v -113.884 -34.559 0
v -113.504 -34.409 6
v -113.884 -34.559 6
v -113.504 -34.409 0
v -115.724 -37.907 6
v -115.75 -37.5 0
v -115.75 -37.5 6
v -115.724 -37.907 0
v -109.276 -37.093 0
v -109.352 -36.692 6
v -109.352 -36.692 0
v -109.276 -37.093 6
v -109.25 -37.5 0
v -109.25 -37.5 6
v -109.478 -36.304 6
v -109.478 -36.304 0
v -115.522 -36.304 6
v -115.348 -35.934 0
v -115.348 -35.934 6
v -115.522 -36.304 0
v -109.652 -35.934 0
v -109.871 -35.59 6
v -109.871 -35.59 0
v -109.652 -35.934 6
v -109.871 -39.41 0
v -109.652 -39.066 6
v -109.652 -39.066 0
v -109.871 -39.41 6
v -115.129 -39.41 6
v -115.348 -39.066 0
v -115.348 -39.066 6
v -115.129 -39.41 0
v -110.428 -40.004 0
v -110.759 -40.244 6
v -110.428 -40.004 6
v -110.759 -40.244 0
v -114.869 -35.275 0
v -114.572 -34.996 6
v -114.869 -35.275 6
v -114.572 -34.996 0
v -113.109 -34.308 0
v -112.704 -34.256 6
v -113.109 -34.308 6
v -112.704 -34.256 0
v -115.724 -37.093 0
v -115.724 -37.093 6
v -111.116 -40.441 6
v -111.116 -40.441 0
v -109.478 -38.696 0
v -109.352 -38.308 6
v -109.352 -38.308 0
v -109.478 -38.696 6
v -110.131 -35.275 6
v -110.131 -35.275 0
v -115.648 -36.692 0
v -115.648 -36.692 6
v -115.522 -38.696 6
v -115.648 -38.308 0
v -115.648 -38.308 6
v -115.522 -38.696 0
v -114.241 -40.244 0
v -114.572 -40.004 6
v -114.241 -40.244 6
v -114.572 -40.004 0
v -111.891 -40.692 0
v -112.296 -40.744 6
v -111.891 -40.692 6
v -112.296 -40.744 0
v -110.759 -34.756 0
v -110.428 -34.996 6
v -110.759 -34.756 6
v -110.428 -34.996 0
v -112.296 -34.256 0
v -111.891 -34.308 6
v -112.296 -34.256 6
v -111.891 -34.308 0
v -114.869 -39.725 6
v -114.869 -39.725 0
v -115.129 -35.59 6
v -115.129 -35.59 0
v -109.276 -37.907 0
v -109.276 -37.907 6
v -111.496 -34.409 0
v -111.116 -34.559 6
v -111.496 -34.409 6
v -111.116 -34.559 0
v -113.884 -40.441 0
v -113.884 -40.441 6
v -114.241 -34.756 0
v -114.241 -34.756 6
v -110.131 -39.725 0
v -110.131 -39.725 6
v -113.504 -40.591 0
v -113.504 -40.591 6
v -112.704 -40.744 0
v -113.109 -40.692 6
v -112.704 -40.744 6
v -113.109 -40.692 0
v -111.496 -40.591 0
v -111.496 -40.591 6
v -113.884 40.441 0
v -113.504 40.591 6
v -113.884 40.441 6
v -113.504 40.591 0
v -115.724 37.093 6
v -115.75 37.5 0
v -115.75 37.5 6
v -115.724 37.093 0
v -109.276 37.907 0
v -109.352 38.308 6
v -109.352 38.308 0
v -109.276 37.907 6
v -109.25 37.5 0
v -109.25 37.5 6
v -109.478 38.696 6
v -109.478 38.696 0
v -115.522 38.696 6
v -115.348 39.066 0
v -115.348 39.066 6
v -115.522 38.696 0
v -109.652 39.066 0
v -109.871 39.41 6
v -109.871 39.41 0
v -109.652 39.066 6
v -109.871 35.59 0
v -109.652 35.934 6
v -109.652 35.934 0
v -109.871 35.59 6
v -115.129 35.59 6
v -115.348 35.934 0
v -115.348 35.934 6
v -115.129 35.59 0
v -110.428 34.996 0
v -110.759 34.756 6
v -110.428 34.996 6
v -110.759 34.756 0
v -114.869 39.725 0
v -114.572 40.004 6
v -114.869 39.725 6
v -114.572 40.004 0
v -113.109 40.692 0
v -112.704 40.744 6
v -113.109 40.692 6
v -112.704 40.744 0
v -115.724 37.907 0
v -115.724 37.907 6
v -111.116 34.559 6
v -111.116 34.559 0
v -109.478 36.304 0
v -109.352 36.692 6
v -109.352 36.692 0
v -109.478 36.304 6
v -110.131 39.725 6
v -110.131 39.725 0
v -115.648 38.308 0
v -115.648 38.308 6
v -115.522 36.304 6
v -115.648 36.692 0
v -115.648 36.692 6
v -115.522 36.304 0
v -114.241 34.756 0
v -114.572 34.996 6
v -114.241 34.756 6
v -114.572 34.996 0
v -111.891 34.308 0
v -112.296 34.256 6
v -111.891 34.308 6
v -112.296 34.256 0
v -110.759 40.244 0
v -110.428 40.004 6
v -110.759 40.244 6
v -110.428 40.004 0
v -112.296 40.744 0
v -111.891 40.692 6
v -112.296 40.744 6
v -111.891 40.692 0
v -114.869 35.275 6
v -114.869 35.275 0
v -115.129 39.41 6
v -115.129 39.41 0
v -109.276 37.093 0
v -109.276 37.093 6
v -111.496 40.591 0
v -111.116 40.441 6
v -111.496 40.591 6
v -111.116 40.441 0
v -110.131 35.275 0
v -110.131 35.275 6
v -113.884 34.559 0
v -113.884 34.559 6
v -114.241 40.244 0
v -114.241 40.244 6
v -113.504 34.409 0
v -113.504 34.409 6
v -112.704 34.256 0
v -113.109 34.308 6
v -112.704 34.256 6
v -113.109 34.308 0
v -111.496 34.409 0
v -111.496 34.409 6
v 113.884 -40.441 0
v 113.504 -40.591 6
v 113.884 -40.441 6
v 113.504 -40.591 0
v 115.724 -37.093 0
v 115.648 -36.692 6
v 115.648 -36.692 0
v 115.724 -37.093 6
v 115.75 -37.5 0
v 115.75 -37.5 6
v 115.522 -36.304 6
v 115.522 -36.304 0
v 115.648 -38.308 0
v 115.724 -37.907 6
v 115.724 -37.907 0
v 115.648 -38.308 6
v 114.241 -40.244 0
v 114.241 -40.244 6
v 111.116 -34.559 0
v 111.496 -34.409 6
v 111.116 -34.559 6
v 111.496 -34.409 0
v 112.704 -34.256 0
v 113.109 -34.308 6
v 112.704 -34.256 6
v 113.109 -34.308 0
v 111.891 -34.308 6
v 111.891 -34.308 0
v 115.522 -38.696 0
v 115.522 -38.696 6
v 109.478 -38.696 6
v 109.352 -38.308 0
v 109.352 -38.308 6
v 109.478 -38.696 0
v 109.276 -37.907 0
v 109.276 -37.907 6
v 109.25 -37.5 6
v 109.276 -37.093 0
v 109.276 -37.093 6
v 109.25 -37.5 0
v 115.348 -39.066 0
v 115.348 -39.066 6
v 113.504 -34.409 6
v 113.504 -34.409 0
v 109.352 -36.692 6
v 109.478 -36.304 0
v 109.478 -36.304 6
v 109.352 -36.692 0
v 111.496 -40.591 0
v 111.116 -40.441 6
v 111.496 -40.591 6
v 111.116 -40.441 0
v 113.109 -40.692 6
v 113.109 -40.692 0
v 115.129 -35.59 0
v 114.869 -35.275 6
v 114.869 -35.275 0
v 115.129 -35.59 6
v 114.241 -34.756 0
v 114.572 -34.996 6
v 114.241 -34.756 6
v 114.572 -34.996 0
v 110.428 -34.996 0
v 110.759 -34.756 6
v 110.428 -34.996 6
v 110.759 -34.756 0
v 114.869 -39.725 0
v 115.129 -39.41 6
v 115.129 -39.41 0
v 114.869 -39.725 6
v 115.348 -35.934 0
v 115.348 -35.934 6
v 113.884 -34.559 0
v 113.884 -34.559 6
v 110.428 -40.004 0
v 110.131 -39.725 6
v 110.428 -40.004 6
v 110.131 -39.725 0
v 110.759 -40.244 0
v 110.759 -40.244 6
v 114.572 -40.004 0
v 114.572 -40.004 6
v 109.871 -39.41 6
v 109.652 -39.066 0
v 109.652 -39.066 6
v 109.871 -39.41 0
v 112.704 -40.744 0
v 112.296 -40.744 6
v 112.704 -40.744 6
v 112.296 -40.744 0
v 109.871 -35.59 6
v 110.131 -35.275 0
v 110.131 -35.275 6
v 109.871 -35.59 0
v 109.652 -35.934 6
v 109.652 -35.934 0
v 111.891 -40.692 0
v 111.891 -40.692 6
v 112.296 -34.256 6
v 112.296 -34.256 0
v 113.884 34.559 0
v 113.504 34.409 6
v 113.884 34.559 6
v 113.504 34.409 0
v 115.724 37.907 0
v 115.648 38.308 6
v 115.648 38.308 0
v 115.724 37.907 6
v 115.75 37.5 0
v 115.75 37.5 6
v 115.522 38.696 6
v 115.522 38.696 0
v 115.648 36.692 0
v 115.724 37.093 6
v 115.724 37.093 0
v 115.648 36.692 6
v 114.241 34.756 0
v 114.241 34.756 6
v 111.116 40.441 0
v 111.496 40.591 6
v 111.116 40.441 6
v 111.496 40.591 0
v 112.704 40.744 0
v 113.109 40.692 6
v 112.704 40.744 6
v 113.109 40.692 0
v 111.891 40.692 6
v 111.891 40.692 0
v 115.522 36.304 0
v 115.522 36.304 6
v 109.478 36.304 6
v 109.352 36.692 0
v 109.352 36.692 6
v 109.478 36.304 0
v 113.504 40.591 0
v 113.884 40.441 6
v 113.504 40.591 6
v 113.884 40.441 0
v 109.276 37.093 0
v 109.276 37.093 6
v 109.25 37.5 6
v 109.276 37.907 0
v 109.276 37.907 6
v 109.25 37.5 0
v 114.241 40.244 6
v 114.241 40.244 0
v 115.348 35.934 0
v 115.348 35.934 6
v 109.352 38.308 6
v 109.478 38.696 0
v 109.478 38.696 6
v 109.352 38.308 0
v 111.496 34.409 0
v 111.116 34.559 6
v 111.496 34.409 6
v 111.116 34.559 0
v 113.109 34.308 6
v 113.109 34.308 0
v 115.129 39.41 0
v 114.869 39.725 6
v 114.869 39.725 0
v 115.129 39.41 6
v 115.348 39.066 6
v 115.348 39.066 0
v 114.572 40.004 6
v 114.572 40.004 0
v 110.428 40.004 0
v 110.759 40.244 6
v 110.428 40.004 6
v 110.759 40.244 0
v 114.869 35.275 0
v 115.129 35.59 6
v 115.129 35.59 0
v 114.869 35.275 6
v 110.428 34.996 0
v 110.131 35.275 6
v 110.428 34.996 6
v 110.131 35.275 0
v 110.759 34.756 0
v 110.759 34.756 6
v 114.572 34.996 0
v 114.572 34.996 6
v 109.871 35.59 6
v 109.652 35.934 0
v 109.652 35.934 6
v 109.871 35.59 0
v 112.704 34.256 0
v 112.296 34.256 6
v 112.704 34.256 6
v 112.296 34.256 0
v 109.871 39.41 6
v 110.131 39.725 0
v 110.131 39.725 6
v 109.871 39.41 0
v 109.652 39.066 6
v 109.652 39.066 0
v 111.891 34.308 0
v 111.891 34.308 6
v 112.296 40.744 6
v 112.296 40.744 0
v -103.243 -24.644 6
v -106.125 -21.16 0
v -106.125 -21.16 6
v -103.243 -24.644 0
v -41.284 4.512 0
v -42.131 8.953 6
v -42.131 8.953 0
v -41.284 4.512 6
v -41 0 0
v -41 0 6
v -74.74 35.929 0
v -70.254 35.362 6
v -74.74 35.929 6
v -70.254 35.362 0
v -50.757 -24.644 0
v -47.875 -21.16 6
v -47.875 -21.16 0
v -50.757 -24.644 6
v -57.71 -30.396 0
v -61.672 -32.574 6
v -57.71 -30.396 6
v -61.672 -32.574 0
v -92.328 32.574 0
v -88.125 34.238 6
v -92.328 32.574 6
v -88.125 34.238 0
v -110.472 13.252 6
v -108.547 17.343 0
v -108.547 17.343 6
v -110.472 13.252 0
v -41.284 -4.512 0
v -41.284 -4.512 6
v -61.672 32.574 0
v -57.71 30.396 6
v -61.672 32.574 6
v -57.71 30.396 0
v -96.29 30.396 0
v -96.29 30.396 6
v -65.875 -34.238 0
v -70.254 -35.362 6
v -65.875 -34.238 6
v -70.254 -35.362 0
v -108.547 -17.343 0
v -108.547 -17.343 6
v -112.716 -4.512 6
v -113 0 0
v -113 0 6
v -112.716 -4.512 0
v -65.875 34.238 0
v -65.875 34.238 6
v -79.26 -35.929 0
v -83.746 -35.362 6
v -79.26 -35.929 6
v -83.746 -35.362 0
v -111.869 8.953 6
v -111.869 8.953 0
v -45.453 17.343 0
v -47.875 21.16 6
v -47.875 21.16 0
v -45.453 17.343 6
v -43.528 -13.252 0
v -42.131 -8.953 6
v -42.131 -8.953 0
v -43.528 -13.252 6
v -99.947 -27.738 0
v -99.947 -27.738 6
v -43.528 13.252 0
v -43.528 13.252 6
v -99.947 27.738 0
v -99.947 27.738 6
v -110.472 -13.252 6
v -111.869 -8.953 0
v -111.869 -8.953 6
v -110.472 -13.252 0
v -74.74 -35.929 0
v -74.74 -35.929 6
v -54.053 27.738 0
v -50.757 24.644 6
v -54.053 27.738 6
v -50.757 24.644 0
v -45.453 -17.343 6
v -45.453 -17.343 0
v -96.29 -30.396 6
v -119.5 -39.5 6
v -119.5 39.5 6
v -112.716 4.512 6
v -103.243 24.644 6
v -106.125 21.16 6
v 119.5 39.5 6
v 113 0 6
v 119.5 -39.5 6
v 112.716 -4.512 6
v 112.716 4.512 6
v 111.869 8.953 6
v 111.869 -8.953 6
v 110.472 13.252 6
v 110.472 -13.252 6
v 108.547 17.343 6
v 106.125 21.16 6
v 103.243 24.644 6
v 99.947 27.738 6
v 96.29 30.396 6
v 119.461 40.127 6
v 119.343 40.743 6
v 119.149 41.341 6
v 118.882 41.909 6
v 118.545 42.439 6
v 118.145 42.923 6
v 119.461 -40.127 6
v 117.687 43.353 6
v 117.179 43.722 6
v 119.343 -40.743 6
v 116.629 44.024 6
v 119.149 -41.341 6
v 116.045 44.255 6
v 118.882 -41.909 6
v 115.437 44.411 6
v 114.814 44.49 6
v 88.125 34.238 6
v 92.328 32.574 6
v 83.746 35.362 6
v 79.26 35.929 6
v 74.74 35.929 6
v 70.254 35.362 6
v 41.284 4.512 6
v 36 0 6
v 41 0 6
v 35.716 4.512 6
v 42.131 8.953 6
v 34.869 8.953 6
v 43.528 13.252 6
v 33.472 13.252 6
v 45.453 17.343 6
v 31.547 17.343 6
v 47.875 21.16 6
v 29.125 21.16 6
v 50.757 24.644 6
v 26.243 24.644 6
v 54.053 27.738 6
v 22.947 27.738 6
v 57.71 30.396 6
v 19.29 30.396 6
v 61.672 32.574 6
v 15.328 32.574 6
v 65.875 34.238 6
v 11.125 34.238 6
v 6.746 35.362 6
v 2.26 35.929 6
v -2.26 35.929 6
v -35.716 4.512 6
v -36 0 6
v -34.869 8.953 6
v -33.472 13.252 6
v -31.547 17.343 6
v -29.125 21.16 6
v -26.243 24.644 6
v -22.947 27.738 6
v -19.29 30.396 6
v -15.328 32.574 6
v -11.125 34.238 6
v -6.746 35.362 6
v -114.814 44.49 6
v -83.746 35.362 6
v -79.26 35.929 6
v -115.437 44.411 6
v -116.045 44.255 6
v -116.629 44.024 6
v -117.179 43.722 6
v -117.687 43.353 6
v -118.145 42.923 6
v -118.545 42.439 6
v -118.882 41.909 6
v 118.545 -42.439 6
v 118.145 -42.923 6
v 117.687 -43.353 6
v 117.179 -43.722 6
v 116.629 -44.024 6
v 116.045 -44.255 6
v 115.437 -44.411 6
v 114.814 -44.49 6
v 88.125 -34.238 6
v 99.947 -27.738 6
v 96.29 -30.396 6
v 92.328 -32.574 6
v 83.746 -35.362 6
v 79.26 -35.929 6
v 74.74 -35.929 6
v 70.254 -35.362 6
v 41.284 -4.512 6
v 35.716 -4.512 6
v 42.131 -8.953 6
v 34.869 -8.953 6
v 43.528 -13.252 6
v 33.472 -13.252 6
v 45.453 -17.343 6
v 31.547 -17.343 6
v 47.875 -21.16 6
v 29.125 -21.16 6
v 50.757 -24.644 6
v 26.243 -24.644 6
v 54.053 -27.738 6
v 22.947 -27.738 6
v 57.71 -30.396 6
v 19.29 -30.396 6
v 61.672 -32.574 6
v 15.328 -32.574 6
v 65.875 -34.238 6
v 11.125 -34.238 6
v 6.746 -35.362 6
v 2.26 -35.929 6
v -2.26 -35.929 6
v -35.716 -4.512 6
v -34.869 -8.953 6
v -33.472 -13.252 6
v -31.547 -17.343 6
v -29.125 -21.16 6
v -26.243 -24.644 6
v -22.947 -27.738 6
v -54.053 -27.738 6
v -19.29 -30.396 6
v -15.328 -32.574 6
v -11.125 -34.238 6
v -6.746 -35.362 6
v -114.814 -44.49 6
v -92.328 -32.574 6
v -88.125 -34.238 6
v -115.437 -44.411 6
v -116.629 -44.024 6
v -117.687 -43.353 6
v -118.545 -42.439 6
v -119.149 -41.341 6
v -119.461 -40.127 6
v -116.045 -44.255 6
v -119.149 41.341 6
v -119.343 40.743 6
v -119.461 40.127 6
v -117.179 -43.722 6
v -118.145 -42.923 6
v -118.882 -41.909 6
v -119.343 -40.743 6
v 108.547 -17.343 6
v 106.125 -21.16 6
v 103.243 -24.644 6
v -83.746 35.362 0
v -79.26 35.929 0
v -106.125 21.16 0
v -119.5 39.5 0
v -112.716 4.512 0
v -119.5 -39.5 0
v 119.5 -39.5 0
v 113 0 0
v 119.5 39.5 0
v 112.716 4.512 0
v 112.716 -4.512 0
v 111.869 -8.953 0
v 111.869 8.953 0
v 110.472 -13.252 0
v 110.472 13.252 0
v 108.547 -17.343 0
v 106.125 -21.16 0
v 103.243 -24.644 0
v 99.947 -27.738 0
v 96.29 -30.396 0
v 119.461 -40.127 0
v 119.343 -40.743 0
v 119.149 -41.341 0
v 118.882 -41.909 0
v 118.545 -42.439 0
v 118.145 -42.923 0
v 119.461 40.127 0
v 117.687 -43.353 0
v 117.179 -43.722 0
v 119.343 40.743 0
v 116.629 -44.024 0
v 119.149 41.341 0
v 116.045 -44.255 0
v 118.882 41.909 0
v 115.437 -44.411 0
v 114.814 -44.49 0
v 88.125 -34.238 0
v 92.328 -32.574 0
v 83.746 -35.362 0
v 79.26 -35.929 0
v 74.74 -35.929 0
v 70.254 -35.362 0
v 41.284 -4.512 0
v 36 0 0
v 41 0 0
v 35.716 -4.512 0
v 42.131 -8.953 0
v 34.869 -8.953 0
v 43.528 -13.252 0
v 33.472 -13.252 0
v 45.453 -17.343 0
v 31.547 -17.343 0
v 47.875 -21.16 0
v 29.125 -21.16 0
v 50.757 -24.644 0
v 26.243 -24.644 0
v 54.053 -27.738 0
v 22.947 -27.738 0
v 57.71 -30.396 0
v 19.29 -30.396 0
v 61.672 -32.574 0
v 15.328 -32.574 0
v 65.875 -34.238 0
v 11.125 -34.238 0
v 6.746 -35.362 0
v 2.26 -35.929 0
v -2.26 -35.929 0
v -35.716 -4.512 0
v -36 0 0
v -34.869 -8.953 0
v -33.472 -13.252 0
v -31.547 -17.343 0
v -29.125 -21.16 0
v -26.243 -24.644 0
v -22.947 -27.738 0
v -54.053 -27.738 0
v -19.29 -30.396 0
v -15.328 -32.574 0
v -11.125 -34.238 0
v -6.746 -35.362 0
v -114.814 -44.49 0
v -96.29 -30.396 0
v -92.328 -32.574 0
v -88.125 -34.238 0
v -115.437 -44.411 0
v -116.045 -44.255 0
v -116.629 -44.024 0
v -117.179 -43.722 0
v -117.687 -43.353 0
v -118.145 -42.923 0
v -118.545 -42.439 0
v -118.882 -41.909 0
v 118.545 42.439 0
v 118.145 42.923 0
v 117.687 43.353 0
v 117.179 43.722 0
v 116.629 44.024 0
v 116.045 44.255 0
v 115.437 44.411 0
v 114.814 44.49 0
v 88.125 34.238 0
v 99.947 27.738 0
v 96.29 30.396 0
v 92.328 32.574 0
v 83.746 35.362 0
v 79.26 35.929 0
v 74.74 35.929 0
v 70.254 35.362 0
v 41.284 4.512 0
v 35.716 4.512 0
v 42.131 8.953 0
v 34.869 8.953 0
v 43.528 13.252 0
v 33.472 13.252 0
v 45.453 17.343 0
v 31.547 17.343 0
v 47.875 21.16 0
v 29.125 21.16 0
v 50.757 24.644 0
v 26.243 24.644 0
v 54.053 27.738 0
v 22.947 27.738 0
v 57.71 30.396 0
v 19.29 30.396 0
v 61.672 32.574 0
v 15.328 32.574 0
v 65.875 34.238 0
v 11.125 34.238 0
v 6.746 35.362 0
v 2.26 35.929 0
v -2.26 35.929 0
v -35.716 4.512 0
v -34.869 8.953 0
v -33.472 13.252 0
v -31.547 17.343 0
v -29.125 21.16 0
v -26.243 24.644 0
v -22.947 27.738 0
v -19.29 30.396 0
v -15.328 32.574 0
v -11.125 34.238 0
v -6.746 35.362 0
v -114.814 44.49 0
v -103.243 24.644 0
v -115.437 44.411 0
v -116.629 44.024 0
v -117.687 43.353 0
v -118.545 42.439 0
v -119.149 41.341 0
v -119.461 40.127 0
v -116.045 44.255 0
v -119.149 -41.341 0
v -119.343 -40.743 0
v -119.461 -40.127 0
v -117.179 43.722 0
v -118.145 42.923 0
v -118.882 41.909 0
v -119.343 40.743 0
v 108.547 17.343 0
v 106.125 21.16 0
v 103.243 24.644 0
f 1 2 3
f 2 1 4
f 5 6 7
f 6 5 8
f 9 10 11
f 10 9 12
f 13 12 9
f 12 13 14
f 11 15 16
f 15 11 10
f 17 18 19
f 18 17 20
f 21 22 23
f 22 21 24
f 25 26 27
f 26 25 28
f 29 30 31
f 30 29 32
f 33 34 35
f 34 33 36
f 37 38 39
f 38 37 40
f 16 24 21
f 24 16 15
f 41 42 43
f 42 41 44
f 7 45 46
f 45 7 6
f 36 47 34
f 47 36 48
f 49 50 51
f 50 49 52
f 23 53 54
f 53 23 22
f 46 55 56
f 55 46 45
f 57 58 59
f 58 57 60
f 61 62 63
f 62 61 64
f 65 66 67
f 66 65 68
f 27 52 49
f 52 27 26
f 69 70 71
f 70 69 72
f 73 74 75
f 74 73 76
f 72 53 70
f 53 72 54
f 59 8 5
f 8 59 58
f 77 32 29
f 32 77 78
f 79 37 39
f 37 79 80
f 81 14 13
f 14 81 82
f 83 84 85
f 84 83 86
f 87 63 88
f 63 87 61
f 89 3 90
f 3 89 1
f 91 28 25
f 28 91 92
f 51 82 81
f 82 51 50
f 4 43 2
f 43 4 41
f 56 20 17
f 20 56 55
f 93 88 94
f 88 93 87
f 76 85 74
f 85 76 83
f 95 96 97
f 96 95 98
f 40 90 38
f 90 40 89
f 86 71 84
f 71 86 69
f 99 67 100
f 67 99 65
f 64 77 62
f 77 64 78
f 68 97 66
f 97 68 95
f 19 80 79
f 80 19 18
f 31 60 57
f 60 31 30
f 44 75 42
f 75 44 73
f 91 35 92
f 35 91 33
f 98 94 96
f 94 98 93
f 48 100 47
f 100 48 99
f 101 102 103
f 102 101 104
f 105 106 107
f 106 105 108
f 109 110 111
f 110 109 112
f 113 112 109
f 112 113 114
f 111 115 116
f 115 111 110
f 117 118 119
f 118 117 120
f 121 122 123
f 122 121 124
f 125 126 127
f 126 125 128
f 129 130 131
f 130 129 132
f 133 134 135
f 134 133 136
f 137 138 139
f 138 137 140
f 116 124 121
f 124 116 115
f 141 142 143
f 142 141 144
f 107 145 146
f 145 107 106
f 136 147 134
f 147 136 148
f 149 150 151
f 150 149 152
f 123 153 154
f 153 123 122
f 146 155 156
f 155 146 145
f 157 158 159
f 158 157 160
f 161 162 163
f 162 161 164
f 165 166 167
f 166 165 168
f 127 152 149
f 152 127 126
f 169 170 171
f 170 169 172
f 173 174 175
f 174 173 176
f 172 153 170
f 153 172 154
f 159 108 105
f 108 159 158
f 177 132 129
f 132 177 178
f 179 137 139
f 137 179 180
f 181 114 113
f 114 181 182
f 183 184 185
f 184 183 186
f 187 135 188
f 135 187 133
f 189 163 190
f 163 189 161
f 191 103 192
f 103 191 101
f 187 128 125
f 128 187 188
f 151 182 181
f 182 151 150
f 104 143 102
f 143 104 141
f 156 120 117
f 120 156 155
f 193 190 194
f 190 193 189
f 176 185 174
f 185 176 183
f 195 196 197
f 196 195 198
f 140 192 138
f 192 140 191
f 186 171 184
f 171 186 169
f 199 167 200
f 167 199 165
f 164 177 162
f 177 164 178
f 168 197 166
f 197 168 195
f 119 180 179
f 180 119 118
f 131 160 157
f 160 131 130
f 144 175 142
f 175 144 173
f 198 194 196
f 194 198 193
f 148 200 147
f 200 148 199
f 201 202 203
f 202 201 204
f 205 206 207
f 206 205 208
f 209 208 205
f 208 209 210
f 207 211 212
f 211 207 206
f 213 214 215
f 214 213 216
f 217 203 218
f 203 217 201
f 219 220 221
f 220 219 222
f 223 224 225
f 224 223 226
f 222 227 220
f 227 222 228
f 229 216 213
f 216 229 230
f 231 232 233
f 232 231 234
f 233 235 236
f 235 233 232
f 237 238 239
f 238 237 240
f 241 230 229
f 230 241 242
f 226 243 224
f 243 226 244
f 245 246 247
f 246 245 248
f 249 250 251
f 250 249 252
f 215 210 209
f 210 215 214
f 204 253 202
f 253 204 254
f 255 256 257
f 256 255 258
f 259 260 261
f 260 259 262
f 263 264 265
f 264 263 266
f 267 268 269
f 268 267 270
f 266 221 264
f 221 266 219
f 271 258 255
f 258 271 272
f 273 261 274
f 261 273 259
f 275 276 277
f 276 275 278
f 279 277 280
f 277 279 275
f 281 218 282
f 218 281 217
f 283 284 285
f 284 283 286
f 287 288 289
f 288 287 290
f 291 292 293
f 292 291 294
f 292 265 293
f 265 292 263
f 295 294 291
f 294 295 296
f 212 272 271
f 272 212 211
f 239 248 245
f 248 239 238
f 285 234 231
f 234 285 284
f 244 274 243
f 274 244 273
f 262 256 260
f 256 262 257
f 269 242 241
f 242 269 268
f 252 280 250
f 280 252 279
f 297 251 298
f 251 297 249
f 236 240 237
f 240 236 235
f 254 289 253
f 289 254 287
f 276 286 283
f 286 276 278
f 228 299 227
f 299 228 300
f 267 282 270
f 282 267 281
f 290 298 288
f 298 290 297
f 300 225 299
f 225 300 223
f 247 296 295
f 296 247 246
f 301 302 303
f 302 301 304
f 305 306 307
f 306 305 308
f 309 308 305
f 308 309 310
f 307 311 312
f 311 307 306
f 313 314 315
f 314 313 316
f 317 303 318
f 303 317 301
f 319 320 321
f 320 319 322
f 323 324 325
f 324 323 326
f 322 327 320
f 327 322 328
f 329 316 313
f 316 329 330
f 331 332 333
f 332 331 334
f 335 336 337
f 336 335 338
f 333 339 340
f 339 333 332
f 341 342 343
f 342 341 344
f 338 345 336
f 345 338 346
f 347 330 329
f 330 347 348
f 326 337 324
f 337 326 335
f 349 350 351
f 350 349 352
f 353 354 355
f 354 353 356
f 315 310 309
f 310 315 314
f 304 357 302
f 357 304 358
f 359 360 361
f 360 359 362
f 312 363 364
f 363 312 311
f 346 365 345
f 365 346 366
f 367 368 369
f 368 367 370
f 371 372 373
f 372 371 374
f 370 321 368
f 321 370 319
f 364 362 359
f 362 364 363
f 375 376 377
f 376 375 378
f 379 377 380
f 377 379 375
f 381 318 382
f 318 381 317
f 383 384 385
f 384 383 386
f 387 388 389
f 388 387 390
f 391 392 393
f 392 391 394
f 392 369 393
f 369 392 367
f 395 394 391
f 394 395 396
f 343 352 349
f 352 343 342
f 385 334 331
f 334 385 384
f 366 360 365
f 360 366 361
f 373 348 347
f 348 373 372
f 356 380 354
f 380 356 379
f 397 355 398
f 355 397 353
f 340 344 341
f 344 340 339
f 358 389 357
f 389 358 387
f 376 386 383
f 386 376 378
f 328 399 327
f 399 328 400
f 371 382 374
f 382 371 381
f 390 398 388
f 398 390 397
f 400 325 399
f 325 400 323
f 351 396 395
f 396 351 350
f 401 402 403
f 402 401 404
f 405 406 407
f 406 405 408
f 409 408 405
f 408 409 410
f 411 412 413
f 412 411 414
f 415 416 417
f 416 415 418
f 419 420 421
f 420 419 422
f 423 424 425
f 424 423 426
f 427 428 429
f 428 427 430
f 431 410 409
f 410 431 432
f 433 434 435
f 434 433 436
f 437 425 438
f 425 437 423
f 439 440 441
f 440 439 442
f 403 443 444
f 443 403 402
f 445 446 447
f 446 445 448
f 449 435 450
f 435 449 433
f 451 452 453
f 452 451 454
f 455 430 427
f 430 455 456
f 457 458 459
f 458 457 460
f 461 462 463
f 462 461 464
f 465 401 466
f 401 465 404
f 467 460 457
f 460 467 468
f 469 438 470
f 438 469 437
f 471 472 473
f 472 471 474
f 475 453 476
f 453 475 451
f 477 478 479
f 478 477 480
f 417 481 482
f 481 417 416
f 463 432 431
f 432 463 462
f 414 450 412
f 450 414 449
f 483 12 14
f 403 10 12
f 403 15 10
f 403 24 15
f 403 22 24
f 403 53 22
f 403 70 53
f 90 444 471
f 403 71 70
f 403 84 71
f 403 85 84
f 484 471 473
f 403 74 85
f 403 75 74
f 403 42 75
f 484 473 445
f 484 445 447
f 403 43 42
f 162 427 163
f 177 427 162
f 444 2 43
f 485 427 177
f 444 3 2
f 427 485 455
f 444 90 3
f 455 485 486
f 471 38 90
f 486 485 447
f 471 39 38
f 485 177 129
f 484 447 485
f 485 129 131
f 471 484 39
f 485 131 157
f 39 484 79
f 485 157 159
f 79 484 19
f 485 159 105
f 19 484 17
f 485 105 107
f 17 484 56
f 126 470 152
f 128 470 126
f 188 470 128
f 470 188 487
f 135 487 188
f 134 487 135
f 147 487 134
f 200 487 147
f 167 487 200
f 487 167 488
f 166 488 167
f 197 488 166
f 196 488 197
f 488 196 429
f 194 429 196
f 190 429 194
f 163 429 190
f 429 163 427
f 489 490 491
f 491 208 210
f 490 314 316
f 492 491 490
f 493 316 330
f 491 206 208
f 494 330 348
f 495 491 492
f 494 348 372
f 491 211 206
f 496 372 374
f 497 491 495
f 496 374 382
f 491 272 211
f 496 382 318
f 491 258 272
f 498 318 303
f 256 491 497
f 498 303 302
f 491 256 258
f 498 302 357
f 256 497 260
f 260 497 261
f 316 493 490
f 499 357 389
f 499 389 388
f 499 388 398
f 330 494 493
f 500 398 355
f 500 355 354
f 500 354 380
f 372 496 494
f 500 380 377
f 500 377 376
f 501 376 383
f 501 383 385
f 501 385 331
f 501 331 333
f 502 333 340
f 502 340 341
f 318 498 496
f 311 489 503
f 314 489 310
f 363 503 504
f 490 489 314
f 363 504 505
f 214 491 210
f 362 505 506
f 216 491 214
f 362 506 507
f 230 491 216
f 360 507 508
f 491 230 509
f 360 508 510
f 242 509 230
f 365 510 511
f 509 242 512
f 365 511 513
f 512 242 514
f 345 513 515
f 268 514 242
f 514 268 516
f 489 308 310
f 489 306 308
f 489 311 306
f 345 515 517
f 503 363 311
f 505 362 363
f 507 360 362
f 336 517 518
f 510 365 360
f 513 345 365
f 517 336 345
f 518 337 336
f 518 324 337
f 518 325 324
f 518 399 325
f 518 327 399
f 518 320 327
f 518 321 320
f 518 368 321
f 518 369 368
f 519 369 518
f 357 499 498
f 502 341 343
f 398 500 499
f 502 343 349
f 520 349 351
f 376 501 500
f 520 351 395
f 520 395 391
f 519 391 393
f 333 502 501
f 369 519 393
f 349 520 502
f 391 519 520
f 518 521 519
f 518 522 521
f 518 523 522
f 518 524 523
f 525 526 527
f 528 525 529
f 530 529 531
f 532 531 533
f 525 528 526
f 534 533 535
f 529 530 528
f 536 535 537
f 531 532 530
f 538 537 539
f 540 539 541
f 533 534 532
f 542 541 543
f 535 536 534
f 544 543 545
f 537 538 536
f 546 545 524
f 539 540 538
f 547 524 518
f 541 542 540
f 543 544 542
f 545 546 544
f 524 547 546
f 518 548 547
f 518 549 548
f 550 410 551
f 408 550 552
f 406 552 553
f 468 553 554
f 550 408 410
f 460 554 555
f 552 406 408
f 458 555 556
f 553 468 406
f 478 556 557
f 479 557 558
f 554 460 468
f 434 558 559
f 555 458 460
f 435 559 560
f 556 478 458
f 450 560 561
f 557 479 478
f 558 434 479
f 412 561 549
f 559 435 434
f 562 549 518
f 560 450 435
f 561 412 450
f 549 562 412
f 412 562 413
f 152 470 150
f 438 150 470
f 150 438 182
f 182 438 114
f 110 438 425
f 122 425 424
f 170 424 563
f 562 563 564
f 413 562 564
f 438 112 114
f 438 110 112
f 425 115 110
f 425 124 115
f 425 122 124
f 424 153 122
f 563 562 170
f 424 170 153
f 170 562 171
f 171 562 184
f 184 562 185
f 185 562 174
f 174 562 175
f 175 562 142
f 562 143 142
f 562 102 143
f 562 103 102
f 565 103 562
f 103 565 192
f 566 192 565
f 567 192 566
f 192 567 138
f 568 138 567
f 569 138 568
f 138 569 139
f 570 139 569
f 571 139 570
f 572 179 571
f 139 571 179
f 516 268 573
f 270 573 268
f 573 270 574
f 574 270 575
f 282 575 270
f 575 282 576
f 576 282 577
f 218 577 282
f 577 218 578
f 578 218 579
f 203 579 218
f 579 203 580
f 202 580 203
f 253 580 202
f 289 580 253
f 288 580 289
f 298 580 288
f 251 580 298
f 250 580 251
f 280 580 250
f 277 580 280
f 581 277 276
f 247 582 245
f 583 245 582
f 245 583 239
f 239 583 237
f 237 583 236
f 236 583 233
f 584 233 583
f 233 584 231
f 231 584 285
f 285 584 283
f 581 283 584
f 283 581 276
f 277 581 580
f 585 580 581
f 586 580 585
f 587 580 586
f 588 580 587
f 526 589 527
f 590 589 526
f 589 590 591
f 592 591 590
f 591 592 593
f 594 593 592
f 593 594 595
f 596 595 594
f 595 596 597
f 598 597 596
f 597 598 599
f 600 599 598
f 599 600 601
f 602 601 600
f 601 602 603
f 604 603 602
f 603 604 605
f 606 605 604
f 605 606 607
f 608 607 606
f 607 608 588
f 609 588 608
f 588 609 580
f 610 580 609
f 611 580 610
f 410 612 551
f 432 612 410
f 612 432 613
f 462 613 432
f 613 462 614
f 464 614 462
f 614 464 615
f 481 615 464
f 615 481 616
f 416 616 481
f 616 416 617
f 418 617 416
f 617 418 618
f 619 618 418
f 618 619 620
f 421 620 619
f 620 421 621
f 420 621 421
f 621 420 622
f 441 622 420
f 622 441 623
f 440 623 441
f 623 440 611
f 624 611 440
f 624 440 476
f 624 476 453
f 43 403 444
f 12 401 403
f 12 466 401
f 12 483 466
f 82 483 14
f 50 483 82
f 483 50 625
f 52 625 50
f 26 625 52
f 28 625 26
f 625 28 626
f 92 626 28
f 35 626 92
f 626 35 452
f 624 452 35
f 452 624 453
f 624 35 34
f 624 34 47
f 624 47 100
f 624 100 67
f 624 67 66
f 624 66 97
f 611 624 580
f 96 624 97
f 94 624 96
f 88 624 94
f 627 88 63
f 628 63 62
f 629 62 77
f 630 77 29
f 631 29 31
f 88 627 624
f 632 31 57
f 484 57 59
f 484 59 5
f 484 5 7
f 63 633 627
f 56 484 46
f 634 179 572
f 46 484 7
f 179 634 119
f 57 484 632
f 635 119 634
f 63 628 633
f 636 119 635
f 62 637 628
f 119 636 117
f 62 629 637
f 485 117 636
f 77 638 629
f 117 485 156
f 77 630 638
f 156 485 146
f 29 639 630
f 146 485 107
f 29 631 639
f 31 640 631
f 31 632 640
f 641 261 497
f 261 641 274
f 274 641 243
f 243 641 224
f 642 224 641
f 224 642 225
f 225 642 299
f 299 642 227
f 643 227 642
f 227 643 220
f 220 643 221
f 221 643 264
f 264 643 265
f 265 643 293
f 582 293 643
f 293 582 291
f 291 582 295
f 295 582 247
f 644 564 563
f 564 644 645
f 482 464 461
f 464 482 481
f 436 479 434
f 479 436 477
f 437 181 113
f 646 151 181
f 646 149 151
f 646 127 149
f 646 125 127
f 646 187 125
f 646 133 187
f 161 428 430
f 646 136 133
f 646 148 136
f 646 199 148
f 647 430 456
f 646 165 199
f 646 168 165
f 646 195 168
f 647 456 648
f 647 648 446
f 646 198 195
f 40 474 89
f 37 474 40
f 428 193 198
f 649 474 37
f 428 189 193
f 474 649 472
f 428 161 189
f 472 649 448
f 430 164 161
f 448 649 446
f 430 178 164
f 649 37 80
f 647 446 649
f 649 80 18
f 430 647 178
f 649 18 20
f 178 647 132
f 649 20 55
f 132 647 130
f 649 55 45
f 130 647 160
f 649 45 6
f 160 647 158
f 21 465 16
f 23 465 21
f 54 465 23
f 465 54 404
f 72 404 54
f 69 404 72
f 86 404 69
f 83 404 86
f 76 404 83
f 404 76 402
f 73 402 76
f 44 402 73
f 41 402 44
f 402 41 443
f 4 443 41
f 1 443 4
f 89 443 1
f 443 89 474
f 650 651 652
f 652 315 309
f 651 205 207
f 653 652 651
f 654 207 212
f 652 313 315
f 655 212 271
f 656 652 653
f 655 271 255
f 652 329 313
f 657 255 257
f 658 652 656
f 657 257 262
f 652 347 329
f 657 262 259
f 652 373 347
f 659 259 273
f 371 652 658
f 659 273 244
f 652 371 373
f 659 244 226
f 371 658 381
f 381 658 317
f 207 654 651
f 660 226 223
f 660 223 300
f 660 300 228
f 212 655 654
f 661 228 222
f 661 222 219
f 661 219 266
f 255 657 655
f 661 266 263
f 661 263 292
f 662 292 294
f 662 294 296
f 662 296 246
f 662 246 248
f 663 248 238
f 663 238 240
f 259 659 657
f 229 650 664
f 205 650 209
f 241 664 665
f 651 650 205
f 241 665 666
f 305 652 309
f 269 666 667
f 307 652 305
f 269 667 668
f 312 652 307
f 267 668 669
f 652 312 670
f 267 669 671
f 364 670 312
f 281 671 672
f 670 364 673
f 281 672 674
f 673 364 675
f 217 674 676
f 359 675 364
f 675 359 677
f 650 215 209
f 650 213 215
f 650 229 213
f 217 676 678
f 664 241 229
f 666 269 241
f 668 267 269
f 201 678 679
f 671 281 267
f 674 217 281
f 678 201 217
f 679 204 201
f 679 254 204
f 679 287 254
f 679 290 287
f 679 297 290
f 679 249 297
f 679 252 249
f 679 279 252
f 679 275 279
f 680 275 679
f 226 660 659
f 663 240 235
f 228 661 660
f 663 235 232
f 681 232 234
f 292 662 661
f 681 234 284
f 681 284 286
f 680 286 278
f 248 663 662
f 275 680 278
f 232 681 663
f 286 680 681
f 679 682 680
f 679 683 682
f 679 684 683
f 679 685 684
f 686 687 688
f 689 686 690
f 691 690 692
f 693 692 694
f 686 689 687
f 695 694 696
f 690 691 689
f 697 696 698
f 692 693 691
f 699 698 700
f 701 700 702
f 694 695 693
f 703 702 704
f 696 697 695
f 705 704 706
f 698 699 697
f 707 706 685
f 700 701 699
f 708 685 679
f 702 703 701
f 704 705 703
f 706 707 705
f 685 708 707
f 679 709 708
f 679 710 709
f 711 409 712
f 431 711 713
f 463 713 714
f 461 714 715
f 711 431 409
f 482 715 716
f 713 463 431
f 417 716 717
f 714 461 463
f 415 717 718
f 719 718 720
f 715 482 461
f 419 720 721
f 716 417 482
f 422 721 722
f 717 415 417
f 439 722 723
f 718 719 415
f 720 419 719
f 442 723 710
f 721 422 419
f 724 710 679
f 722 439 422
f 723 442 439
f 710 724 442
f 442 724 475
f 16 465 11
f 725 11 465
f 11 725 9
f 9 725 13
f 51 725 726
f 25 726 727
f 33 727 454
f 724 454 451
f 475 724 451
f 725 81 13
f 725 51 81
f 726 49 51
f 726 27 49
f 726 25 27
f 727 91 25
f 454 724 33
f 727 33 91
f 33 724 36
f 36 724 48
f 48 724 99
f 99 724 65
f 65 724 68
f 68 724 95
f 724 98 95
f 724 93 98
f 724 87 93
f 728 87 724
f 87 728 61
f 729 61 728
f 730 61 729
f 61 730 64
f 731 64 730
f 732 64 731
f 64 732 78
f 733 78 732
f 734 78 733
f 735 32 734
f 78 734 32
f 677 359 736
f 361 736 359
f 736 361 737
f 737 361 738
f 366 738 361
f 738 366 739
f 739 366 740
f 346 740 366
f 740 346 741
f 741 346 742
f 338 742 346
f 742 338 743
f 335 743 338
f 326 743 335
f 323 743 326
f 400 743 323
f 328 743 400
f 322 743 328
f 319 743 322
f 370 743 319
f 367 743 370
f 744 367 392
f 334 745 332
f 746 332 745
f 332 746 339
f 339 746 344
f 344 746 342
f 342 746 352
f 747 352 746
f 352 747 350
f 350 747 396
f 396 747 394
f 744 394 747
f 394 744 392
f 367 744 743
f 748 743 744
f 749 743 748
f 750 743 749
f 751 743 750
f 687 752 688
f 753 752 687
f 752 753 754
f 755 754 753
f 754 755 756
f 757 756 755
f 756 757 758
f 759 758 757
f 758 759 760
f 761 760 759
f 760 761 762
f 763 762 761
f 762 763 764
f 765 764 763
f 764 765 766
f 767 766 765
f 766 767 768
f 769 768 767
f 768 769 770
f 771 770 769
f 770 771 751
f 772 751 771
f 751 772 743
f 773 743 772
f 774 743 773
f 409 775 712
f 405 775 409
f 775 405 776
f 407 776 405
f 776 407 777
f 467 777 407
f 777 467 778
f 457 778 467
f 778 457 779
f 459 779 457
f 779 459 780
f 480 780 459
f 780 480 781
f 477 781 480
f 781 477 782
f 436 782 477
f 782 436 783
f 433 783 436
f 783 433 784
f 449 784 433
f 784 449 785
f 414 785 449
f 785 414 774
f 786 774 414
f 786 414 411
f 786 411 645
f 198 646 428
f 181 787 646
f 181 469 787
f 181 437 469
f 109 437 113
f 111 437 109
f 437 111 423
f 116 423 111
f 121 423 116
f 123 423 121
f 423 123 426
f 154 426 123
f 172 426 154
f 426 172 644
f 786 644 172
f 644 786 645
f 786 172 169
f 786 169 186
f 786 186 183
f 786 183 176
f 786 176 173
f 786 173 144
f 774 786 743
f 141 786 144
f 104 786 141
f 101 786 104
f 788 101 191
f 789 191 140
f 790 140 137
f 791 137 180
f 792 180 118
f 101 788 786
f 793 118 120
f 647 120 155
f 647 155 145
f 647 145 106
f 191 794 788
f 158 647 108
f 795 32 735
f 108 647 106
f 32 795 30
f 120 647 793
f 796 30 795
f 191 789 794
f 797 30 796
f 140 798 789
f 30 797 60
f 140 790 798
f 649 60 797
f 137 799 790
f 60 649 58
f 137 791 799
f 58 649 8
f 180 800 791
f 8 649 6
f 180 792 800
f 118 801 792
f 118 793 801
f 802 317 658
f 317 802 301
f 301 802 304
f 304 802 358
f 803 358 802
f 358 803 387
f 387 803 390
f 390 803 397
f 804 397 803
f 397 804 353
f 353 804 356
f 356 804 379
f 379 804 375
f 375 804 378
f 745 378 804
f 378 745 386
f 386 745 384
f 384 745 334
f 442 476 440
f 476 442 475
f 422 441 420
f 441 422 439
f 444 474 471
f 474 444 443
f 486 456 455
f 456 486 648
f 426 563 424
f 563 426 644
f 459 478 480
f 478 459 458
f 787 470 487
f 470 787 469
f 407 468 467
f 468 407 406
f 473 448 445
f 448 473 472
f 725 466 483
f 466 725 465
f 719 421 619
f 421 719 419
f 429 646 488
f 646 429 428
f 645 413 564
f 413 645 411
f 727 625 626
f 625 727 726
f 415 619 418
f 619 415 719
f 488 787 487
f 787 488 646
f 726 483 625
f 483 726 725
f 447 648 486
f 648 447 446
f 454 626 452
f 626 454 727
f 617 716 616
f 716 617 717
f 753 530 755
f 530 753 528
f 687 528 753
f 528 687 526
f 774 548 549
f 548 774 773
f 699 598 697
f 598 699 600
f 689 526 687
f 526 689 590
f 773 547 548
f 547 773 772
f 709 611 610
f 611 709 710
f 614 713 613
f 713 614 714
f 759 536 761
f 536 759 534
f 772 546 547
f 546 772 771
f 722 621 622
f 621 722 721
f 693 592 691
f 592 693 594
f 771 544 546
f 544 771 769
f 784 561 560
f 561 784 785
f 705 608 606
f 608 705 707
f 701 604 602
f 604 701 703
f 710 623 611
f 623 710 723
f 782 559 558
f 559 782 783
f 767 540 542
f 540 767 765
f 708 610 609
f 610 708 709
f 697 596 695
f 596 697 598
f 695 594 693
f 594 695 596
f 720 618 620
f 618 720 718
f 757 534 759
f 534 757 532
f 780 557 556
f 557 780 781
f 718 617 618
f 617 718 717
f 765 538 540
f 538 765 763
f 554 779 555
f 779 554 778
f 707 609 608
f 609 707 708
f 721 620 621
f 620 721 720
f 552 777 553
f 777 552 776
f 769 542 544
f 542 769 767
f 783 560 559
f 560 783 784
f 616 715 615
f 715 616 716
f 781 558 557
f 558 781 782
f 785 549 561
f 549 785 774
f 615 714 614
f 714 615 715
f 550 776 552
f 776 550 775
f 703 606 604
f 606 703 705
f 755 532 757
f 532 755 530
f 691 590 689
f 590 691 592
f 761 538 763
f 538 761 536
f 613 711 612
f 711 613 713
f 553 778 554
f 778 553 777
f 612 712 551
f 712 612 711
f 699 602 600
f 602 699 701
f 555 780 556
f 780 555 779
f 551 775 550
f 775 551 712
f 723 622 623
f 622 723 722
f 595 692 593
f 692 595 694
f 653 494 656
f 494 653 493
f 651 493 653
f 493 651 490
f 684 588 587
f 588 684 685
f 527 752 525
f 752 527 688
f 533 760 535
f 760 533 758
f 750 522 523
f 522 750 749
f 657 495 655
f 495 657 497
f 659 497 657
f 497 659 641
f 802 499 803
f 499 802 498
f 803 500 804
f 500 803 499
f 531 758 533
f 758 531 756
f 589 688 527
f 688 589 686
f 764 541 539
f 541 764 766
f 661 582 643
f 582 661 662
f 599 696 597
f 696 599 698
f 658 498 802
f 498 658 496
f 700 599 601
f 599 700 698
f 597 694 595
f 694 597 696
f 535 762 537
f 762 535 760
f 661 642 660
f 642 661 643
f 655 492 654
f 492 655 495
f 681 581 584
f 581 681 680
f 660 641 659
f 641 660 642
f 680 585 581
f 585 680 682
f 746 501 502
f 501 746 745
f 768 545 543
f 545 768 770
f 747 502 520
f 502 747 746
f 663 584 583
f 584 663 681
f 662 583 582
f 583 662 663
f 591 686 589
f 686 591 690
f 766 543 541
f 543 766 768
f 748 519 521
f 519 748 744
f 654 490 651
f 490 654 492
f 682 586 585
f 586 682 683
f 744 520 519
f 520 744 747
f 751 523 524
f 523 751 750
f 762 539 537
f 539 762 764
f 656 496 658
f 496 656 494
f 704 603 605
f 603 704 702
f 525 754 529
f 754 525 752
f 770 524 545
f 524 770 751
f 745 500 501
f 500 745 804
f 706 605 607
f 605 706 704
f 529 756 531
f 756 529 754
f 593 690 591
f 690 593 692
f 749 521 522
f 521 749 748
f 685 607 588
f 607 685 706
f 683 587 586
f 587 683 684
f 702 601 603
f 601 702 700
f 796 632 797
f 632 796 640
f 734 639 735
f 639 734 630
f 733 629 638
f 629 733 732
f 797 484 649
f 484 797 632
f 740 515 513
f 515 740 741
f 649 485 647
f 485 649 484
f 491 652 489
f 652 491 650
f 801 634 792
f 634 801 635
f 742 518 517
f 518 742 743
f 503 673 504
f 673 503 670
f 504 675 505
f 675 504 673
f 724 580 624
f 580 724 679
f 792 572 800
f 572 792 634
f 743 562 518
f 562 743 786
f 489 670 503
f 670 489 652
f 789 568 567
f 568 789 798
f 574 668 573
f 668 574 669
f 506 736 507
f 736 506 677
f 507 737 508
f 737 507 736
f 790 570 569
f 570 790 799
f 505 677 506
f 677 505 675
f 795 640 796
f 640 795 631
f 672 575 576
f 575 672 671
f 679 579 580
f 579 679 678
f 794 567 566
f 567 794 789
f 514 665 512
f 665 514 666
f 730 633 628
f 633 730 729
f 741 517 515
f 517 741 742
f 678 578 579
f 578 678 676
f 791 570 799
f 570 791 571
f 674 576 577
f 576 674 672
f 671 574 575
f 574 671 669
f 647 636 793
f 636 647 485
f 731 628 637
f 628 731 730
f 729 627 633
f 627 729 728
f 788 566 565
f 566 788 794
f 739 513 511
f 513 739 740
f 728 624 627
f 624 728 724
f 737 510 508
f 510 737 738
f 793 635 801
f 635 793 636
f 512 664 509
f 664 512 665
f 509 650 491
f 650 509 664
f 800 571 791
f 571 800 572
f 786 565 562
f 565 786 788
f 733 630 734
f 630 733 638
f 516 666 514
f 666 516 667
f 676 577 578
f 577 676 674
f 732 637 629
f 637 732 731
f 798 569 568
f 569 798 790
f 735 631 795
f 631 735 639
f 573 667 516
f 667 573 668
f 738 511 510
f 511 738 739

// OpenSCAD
$fn = 50;


difference() {
	union() {
		hull() {
			translate(v = [-114.5000000000, 39.5000000000, 0]) {
				cylinder(h = 6, r = 5);
			}
			translate(v = [114.5000000000, 39.5000000000, 0]) {
				cylinder(h = 6, r = 5);
			}
			translate(v = [-114.5000000000, -39.5000000000, 0]) {
				cylinder(h = 6, r = 5);
			}
			translate(v = [114.5000000000, -39.5000000000, 0]) {
				cylinder(h = 6, r = 5);
			}
		}
	}
	union() {
		#translate(v = [-112.5000000000, -37.5000000000, -100.0000000000]) {
			cylinder(h = 200, r = 3.2500000000);
		}
		#translate(v = [-112.5000000000, 37.5000000000, -100.0000000000]) {
			cylinder(h = 200, r = 3.2500000000);
		}
		#translate(v = [112.5000000000, -37.5000000000, -100.0000000000]) {
			cylinder(h = 200, r = 3.2500000000);
		}
		#translate(v = [112.5000000000, 37.5000000000, -100.0000000000]) {
			cylinder(h = 200, r = 3.2500000000);
		}
		#translate(v = [-77.0000000000, 0, 0]) {
			cylinder(h = 6, r = 36.0000000000);
		}
		#cylinder(h = 6, r = 36.0000000000);
		#translate(v = [77.0000000000, 0, 0]) {
			cylinder(h = 6, r = 36.0000000000);
		}
	}
}
